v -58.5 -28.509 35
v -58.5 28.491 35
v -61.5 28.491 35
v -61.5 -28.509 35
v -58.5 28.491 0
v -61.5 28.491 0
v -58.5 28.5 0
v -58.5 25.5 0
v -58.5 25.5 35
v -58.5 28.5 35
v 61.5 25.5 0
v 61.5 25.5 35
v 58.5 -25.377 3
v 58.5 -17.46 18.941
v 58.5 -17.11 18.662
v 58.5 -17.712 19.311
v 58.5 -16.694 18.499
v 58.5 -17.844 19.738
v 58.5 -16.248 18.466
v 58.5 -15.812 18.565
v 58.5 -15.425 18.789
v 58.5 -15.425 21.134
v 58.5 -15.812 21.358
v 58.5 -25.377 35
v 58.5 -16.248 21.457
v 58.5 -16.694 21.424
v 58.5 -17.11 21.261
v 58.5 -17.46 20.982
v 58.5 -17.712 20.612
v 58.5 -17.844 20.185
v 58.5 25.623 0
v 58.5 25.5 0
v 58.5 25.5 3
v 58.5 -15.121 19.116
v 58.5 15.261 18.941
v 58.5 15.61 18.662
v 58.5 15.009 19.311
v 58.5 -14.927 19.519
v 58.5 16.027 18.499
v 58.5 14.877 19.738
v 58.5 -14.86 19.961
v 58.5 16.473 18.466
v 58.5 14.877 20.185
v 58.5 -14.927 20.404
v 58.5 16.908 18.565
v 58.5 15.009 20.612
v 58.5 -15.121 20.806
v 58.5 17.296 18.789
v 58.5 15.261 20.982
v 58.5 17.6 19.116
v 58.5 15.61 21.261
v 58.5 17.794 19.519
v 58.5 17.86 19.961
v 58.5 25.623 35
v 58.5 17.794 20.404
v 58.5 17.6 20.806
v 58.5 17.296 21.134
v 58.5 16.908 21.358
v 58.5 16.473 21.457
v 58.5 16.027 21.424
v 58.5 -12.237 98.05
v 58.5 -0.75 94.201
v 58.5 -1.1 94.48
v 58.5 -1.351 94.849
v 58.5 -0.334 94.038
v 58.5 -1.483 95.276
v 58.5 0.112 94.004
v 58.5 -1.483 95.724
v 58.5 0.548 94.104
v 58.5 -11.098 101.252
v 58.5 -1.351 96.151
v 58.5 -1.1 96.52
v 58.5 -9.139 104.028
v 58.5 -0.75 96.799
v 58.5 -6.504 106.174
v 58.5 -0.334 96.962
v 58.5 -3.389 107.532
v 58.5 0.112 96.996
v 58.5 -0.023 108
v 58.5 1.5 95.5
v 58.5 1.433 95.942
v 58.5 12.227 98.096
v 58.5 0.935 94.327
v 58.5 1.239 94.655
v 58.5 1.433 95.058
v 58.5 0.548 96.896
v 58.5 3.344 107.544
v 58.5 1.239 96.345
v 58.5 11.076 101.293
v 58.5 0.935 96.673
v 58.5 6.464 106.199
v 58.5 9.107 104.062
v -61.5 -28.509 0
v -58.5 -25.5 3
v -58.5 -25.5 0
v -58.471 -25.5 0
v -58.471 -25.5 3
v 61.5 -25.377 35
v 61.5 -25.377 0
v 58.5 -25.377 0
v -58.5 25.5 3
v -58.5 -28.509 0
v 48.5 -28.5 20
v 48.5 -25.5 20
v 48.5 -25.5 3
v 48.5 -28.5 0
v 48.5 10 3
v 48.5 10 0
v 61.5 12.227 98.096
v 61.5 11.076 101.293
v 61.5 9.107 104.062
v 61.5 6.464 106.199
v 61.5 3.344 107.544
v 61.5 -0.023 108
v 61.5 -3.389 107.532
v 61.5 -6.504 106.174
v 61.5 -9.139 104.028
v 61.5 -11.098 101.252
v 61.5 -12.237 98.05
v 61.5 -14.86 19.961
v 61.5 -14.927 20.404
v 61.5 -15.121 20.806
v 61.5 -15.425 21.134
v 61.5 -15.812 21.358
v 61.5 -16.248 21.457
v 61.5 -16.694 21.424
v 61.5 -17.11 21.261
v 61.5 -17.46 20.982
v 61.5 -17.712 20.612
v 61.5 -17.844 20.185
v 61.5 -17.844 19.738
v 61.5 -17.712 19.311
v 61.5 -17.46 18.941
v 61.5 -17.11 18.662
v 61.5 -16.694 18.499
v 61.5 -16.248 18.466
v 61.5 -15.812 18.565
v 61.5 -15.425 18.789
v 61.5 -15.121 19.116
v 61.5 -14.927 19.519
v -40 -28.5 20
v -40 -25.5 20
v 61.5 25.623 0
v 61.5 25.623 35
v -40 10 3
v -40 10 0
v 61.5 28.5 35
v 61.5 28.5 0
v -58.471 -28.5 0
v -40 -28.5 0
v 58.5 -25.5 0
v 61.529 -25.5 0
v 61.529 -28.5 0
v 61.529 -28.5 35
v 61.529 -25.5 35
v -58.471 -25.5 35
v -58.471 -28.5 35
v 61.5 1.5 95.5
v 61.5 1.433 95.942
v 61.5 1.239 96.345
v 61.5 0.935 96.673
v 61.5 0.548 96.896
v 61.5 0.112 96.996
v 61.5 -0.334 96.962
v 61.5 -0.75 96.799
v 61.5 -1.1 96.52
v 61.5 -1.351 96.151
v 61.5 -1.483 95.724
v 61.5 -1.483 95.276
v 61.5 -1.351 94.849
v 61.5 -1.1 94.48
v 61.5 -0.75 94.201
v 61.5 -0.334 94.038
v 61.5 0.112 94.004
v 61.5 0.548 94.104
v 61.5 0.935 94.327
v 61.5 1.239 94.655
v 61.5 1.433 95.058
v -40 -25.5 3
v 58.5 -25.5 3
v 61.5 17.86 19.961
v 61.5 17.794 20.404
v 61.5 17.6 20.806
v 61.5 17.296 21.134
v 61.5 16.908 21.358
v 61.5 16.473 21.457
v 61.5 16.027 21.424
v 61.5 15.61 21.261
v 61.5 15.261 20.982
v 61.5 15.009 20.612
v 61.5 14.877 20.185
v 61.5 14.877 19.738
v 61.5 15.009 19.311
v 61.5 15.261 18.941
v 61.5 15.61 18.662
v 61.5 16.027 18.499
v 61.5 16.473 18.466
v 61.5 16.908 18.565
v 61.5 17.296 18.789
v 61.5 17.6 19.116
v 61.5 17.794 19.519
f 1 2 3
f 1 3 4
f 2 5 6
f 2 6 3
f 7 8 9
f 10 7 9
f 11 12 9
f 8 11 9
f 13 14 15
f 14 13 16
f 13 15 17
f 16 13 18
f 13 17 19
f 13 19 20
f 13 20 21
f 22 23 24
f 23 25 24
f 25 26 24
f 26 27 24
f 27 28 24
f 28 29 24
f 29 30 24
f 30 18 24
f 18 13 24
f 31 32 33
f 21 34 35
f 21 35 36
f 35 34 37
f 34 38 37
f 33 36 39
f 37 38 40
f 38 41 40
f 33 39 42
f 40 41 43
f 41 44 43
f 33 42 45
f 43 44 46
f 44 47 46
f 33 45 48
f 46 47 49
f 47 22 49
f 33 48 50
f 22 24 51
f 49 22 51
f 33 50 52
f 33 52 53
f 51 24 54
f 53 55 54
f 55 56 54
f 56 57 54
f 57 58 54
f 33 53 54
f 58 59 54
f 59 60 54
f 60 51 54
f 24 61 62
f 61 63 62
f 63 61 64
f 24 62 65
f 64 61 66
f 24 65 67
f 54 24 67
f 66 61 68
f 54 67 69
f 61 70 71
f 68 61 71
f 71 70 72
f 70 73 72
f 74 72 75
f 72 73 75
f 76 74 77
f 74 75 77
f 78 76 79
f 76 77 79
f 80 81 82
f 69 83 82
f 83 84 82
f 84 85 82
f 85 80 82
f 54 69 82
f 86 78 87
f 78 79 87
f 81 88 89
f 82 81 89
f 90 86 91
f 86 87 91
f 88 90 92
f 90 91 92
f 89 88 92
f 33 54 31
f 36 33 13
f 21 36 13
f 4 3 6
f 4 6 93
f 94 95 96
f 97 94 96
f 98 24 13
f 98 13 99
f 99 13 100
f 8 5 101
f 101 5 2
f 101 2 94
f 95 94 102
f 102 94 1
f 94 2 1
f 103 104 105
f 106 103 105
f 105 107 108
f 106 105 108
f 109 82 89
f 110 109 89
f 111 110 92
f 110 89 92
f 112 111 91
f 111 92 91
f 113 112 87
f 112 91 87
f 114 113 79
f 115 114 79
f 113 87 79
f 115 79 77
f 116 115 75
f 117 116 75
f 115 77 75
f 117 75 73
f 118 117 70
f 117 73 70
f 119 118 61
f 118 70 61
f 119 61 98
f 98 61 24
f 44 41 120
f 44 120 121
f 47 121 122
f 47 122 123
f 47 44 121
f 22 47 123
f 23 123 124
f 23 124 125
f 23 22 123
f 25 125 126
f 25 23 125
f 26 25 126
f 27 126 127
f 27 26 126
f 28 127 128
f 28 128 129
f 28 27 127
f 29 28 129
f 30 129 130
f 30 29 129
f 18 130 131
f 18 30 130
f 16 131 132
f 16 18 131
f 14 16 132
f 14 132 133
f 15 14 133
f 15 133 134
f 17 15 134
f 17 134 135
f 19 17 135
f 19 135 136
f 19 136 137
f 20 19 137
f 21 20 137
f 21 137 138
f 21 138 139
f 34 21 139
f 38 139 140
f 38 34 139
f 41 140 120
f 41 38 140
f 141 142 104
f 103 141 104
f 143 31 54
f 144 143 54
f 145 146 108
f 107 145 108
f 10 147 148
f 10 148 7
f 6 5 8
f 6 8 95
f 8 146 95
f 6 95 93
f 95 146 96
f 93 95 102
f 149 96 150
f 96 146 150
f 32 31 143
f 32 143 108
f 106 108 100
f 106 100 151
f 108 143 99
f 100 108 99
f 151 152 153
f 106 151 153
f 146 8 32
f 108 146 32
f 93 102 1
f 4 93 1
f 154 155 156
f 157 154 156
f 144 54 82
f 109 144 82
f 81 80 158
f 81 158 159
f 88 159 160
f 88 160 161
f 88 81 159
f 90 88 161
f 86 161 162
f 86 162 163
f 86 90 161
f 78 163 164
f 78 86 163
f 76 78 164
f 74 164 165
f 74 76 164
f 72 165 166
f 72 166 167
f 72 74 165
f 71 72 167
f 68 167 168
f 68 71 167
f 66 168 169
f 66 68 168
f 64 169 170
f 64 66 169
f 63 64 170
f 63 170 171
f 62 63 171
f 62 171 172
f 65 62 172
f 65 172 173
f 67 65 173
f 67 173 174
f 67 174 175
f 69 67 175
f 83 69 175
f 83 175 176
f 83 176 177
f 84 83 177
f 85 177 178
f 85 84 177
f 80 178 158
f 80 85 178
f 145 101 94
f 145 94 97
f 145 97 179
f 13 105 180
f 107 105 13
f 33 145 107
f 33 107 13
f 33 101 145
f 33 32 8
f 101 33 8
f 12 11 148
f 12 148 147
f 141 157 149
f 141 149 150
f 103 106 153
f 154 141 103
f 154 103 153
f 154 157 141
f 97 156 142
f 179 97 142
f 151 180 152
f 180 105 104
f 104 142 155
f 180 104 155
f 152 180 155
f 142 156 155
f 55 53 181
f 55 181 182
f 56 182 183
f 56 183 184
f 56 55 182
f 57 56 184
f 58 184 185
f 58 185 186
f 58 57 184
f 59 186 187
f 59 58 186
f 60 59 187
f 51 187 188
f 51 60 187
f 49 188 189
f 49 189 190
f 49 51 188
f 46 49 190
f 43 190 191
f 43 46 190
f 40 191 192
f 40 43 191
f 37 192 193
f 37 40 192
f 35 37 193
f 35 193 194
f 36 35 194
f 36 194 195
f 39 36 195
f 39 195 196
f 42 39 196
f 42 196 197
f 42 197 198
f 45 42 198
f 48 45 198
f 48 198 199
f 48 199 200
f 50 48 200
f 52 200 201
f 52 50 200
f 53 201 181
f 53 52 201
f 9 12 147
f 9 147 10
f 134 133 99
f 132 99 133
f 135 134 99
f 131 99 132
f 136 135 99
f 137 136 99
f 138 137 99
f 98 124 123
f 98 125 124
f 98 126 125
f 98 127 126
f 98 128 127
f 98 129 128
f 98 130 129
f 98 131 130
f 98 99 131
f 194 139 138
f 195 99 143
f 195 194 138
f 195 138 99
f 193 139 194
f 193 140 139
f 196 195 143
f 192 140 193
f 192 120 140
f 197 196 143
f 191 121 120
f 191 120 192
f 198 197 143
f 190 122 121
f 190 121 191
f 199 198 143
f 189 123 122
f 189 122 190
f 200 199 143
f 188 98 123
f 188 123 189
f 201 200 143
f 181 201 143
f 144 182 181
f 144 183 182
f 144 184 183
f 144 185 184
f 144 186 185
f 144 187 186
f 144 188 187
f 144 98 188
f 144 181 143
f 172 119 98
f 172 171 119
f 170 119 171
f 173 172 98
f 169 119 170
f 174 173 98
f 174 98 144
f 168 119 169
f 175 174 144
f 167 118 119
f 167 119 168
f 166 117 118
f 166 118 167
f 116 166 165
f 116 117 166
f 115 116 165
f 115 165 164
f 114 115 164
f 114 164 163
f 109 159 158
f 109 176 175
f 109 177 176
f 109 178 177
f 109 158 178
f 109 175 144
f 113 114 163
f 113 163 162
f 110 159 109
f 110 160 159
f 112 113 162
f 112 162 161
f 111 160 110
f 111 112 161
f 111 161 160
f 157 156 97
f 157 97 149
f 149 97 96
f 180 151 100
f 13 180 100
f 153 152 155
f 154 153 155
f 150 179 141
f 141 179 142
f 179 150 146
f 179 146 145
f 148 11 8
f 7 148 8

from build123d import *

# Parameters (mm, degrees)
F1_DEPTH  = 3
F3_R      = 1.5
F4_DEPTH  = 3
F7_DEPTH  = 3
F9_W      = 120
F9_H      = 35
F10_DEPTH = 3
F12_W     = 57
F12_H     = 35
F13_DEPTH = 3


with BuildPart() as f1:
    # F0 (on Top) → F1 (new body)
    with BuildSketch(Plane.XY):
        Polygon((58.5, 25.5), (-58.5, 25.5), (-58.5, -25.5), (-40, -25.5), (-40, 10), (48.5, 10), (48.5, -25.5), (58.5, -25.5), align=None)
    extrude(amount=F1_DEPTH)

    # F3 (on offset) → F4 (join)
    with BuildSketch(Plane.YZ.offset(58.5)):
        with BuildLine():
            Line((25.6231492609, 35), (12.2274665574, 98.0959702592))
            ThreePointArc((12.2274665574, 98.0959702592), (-0.0233718405, 107.9999781503), (-12.2370886636, 98.0502276446))
            Line((-12.2370886636, 98.0502276446), (-25.3768507391, 35))
            Line((-25.3768507391, 35), (-25.3768507391, 0))
            Line((-25.3768507391, 0), (25.6231492609, 0))
            Line((25.6231492609, 0), (25.6231492609, 35))
        make_face()
        with Locations((-16.3604691625, 19.9614744633)):
            Circle(F3_R, mode=Mode.SUBTRACT)
        with Locations((16.3604691625, 19.9614744633)):
            Circle(F3_R, mode=Mode.SUBTRACT)
        with Locations((0, 95.5)):
            Circle(F3_R, mode=Mode.SUBTRACT)
    extrude(amount=F4_DEPTH)

    # F6 (on offset) → F7 (join)
    with BuildSketch(Plane.XZ.offset(25.5)):
        Polygon((61.5285639184, 35), (-58.4714360816, 35), (-58.4714360816, 0), (-40, 0), (-40, 20), (48.5, 20), (48.5, 0), (61.5285639184, 0), align=None)
    extrude(amount=F7_DEPTH)

    # F12 (on offset) → F13 (join)
    with BuildSketch(Plane(origin=(-58.5, 0, 0), x_dir=(0, -1, 0), z_dir=(-1, 0, 0))):
        with Locations((0.0093167428, 17.5)):
            Rectangle(F12_W, F12_H)
    extrude(amount=F13_DEPTH)


with BuildPart() as f10:
    # F9 (on offset) → F10 (new body)
    with BuildSketch(Plane(origin=(0, 25.5, 0), x_dir=(-1, 0, 0), z_dir=(0, 1, 0))):
        with Locations((-1.5002019403, 17.5)):
            Rectangle(F9_W, F9_H)
    extrude(amount=F10_DEPTH)


solid = Compound([f1.part, f10.part])
